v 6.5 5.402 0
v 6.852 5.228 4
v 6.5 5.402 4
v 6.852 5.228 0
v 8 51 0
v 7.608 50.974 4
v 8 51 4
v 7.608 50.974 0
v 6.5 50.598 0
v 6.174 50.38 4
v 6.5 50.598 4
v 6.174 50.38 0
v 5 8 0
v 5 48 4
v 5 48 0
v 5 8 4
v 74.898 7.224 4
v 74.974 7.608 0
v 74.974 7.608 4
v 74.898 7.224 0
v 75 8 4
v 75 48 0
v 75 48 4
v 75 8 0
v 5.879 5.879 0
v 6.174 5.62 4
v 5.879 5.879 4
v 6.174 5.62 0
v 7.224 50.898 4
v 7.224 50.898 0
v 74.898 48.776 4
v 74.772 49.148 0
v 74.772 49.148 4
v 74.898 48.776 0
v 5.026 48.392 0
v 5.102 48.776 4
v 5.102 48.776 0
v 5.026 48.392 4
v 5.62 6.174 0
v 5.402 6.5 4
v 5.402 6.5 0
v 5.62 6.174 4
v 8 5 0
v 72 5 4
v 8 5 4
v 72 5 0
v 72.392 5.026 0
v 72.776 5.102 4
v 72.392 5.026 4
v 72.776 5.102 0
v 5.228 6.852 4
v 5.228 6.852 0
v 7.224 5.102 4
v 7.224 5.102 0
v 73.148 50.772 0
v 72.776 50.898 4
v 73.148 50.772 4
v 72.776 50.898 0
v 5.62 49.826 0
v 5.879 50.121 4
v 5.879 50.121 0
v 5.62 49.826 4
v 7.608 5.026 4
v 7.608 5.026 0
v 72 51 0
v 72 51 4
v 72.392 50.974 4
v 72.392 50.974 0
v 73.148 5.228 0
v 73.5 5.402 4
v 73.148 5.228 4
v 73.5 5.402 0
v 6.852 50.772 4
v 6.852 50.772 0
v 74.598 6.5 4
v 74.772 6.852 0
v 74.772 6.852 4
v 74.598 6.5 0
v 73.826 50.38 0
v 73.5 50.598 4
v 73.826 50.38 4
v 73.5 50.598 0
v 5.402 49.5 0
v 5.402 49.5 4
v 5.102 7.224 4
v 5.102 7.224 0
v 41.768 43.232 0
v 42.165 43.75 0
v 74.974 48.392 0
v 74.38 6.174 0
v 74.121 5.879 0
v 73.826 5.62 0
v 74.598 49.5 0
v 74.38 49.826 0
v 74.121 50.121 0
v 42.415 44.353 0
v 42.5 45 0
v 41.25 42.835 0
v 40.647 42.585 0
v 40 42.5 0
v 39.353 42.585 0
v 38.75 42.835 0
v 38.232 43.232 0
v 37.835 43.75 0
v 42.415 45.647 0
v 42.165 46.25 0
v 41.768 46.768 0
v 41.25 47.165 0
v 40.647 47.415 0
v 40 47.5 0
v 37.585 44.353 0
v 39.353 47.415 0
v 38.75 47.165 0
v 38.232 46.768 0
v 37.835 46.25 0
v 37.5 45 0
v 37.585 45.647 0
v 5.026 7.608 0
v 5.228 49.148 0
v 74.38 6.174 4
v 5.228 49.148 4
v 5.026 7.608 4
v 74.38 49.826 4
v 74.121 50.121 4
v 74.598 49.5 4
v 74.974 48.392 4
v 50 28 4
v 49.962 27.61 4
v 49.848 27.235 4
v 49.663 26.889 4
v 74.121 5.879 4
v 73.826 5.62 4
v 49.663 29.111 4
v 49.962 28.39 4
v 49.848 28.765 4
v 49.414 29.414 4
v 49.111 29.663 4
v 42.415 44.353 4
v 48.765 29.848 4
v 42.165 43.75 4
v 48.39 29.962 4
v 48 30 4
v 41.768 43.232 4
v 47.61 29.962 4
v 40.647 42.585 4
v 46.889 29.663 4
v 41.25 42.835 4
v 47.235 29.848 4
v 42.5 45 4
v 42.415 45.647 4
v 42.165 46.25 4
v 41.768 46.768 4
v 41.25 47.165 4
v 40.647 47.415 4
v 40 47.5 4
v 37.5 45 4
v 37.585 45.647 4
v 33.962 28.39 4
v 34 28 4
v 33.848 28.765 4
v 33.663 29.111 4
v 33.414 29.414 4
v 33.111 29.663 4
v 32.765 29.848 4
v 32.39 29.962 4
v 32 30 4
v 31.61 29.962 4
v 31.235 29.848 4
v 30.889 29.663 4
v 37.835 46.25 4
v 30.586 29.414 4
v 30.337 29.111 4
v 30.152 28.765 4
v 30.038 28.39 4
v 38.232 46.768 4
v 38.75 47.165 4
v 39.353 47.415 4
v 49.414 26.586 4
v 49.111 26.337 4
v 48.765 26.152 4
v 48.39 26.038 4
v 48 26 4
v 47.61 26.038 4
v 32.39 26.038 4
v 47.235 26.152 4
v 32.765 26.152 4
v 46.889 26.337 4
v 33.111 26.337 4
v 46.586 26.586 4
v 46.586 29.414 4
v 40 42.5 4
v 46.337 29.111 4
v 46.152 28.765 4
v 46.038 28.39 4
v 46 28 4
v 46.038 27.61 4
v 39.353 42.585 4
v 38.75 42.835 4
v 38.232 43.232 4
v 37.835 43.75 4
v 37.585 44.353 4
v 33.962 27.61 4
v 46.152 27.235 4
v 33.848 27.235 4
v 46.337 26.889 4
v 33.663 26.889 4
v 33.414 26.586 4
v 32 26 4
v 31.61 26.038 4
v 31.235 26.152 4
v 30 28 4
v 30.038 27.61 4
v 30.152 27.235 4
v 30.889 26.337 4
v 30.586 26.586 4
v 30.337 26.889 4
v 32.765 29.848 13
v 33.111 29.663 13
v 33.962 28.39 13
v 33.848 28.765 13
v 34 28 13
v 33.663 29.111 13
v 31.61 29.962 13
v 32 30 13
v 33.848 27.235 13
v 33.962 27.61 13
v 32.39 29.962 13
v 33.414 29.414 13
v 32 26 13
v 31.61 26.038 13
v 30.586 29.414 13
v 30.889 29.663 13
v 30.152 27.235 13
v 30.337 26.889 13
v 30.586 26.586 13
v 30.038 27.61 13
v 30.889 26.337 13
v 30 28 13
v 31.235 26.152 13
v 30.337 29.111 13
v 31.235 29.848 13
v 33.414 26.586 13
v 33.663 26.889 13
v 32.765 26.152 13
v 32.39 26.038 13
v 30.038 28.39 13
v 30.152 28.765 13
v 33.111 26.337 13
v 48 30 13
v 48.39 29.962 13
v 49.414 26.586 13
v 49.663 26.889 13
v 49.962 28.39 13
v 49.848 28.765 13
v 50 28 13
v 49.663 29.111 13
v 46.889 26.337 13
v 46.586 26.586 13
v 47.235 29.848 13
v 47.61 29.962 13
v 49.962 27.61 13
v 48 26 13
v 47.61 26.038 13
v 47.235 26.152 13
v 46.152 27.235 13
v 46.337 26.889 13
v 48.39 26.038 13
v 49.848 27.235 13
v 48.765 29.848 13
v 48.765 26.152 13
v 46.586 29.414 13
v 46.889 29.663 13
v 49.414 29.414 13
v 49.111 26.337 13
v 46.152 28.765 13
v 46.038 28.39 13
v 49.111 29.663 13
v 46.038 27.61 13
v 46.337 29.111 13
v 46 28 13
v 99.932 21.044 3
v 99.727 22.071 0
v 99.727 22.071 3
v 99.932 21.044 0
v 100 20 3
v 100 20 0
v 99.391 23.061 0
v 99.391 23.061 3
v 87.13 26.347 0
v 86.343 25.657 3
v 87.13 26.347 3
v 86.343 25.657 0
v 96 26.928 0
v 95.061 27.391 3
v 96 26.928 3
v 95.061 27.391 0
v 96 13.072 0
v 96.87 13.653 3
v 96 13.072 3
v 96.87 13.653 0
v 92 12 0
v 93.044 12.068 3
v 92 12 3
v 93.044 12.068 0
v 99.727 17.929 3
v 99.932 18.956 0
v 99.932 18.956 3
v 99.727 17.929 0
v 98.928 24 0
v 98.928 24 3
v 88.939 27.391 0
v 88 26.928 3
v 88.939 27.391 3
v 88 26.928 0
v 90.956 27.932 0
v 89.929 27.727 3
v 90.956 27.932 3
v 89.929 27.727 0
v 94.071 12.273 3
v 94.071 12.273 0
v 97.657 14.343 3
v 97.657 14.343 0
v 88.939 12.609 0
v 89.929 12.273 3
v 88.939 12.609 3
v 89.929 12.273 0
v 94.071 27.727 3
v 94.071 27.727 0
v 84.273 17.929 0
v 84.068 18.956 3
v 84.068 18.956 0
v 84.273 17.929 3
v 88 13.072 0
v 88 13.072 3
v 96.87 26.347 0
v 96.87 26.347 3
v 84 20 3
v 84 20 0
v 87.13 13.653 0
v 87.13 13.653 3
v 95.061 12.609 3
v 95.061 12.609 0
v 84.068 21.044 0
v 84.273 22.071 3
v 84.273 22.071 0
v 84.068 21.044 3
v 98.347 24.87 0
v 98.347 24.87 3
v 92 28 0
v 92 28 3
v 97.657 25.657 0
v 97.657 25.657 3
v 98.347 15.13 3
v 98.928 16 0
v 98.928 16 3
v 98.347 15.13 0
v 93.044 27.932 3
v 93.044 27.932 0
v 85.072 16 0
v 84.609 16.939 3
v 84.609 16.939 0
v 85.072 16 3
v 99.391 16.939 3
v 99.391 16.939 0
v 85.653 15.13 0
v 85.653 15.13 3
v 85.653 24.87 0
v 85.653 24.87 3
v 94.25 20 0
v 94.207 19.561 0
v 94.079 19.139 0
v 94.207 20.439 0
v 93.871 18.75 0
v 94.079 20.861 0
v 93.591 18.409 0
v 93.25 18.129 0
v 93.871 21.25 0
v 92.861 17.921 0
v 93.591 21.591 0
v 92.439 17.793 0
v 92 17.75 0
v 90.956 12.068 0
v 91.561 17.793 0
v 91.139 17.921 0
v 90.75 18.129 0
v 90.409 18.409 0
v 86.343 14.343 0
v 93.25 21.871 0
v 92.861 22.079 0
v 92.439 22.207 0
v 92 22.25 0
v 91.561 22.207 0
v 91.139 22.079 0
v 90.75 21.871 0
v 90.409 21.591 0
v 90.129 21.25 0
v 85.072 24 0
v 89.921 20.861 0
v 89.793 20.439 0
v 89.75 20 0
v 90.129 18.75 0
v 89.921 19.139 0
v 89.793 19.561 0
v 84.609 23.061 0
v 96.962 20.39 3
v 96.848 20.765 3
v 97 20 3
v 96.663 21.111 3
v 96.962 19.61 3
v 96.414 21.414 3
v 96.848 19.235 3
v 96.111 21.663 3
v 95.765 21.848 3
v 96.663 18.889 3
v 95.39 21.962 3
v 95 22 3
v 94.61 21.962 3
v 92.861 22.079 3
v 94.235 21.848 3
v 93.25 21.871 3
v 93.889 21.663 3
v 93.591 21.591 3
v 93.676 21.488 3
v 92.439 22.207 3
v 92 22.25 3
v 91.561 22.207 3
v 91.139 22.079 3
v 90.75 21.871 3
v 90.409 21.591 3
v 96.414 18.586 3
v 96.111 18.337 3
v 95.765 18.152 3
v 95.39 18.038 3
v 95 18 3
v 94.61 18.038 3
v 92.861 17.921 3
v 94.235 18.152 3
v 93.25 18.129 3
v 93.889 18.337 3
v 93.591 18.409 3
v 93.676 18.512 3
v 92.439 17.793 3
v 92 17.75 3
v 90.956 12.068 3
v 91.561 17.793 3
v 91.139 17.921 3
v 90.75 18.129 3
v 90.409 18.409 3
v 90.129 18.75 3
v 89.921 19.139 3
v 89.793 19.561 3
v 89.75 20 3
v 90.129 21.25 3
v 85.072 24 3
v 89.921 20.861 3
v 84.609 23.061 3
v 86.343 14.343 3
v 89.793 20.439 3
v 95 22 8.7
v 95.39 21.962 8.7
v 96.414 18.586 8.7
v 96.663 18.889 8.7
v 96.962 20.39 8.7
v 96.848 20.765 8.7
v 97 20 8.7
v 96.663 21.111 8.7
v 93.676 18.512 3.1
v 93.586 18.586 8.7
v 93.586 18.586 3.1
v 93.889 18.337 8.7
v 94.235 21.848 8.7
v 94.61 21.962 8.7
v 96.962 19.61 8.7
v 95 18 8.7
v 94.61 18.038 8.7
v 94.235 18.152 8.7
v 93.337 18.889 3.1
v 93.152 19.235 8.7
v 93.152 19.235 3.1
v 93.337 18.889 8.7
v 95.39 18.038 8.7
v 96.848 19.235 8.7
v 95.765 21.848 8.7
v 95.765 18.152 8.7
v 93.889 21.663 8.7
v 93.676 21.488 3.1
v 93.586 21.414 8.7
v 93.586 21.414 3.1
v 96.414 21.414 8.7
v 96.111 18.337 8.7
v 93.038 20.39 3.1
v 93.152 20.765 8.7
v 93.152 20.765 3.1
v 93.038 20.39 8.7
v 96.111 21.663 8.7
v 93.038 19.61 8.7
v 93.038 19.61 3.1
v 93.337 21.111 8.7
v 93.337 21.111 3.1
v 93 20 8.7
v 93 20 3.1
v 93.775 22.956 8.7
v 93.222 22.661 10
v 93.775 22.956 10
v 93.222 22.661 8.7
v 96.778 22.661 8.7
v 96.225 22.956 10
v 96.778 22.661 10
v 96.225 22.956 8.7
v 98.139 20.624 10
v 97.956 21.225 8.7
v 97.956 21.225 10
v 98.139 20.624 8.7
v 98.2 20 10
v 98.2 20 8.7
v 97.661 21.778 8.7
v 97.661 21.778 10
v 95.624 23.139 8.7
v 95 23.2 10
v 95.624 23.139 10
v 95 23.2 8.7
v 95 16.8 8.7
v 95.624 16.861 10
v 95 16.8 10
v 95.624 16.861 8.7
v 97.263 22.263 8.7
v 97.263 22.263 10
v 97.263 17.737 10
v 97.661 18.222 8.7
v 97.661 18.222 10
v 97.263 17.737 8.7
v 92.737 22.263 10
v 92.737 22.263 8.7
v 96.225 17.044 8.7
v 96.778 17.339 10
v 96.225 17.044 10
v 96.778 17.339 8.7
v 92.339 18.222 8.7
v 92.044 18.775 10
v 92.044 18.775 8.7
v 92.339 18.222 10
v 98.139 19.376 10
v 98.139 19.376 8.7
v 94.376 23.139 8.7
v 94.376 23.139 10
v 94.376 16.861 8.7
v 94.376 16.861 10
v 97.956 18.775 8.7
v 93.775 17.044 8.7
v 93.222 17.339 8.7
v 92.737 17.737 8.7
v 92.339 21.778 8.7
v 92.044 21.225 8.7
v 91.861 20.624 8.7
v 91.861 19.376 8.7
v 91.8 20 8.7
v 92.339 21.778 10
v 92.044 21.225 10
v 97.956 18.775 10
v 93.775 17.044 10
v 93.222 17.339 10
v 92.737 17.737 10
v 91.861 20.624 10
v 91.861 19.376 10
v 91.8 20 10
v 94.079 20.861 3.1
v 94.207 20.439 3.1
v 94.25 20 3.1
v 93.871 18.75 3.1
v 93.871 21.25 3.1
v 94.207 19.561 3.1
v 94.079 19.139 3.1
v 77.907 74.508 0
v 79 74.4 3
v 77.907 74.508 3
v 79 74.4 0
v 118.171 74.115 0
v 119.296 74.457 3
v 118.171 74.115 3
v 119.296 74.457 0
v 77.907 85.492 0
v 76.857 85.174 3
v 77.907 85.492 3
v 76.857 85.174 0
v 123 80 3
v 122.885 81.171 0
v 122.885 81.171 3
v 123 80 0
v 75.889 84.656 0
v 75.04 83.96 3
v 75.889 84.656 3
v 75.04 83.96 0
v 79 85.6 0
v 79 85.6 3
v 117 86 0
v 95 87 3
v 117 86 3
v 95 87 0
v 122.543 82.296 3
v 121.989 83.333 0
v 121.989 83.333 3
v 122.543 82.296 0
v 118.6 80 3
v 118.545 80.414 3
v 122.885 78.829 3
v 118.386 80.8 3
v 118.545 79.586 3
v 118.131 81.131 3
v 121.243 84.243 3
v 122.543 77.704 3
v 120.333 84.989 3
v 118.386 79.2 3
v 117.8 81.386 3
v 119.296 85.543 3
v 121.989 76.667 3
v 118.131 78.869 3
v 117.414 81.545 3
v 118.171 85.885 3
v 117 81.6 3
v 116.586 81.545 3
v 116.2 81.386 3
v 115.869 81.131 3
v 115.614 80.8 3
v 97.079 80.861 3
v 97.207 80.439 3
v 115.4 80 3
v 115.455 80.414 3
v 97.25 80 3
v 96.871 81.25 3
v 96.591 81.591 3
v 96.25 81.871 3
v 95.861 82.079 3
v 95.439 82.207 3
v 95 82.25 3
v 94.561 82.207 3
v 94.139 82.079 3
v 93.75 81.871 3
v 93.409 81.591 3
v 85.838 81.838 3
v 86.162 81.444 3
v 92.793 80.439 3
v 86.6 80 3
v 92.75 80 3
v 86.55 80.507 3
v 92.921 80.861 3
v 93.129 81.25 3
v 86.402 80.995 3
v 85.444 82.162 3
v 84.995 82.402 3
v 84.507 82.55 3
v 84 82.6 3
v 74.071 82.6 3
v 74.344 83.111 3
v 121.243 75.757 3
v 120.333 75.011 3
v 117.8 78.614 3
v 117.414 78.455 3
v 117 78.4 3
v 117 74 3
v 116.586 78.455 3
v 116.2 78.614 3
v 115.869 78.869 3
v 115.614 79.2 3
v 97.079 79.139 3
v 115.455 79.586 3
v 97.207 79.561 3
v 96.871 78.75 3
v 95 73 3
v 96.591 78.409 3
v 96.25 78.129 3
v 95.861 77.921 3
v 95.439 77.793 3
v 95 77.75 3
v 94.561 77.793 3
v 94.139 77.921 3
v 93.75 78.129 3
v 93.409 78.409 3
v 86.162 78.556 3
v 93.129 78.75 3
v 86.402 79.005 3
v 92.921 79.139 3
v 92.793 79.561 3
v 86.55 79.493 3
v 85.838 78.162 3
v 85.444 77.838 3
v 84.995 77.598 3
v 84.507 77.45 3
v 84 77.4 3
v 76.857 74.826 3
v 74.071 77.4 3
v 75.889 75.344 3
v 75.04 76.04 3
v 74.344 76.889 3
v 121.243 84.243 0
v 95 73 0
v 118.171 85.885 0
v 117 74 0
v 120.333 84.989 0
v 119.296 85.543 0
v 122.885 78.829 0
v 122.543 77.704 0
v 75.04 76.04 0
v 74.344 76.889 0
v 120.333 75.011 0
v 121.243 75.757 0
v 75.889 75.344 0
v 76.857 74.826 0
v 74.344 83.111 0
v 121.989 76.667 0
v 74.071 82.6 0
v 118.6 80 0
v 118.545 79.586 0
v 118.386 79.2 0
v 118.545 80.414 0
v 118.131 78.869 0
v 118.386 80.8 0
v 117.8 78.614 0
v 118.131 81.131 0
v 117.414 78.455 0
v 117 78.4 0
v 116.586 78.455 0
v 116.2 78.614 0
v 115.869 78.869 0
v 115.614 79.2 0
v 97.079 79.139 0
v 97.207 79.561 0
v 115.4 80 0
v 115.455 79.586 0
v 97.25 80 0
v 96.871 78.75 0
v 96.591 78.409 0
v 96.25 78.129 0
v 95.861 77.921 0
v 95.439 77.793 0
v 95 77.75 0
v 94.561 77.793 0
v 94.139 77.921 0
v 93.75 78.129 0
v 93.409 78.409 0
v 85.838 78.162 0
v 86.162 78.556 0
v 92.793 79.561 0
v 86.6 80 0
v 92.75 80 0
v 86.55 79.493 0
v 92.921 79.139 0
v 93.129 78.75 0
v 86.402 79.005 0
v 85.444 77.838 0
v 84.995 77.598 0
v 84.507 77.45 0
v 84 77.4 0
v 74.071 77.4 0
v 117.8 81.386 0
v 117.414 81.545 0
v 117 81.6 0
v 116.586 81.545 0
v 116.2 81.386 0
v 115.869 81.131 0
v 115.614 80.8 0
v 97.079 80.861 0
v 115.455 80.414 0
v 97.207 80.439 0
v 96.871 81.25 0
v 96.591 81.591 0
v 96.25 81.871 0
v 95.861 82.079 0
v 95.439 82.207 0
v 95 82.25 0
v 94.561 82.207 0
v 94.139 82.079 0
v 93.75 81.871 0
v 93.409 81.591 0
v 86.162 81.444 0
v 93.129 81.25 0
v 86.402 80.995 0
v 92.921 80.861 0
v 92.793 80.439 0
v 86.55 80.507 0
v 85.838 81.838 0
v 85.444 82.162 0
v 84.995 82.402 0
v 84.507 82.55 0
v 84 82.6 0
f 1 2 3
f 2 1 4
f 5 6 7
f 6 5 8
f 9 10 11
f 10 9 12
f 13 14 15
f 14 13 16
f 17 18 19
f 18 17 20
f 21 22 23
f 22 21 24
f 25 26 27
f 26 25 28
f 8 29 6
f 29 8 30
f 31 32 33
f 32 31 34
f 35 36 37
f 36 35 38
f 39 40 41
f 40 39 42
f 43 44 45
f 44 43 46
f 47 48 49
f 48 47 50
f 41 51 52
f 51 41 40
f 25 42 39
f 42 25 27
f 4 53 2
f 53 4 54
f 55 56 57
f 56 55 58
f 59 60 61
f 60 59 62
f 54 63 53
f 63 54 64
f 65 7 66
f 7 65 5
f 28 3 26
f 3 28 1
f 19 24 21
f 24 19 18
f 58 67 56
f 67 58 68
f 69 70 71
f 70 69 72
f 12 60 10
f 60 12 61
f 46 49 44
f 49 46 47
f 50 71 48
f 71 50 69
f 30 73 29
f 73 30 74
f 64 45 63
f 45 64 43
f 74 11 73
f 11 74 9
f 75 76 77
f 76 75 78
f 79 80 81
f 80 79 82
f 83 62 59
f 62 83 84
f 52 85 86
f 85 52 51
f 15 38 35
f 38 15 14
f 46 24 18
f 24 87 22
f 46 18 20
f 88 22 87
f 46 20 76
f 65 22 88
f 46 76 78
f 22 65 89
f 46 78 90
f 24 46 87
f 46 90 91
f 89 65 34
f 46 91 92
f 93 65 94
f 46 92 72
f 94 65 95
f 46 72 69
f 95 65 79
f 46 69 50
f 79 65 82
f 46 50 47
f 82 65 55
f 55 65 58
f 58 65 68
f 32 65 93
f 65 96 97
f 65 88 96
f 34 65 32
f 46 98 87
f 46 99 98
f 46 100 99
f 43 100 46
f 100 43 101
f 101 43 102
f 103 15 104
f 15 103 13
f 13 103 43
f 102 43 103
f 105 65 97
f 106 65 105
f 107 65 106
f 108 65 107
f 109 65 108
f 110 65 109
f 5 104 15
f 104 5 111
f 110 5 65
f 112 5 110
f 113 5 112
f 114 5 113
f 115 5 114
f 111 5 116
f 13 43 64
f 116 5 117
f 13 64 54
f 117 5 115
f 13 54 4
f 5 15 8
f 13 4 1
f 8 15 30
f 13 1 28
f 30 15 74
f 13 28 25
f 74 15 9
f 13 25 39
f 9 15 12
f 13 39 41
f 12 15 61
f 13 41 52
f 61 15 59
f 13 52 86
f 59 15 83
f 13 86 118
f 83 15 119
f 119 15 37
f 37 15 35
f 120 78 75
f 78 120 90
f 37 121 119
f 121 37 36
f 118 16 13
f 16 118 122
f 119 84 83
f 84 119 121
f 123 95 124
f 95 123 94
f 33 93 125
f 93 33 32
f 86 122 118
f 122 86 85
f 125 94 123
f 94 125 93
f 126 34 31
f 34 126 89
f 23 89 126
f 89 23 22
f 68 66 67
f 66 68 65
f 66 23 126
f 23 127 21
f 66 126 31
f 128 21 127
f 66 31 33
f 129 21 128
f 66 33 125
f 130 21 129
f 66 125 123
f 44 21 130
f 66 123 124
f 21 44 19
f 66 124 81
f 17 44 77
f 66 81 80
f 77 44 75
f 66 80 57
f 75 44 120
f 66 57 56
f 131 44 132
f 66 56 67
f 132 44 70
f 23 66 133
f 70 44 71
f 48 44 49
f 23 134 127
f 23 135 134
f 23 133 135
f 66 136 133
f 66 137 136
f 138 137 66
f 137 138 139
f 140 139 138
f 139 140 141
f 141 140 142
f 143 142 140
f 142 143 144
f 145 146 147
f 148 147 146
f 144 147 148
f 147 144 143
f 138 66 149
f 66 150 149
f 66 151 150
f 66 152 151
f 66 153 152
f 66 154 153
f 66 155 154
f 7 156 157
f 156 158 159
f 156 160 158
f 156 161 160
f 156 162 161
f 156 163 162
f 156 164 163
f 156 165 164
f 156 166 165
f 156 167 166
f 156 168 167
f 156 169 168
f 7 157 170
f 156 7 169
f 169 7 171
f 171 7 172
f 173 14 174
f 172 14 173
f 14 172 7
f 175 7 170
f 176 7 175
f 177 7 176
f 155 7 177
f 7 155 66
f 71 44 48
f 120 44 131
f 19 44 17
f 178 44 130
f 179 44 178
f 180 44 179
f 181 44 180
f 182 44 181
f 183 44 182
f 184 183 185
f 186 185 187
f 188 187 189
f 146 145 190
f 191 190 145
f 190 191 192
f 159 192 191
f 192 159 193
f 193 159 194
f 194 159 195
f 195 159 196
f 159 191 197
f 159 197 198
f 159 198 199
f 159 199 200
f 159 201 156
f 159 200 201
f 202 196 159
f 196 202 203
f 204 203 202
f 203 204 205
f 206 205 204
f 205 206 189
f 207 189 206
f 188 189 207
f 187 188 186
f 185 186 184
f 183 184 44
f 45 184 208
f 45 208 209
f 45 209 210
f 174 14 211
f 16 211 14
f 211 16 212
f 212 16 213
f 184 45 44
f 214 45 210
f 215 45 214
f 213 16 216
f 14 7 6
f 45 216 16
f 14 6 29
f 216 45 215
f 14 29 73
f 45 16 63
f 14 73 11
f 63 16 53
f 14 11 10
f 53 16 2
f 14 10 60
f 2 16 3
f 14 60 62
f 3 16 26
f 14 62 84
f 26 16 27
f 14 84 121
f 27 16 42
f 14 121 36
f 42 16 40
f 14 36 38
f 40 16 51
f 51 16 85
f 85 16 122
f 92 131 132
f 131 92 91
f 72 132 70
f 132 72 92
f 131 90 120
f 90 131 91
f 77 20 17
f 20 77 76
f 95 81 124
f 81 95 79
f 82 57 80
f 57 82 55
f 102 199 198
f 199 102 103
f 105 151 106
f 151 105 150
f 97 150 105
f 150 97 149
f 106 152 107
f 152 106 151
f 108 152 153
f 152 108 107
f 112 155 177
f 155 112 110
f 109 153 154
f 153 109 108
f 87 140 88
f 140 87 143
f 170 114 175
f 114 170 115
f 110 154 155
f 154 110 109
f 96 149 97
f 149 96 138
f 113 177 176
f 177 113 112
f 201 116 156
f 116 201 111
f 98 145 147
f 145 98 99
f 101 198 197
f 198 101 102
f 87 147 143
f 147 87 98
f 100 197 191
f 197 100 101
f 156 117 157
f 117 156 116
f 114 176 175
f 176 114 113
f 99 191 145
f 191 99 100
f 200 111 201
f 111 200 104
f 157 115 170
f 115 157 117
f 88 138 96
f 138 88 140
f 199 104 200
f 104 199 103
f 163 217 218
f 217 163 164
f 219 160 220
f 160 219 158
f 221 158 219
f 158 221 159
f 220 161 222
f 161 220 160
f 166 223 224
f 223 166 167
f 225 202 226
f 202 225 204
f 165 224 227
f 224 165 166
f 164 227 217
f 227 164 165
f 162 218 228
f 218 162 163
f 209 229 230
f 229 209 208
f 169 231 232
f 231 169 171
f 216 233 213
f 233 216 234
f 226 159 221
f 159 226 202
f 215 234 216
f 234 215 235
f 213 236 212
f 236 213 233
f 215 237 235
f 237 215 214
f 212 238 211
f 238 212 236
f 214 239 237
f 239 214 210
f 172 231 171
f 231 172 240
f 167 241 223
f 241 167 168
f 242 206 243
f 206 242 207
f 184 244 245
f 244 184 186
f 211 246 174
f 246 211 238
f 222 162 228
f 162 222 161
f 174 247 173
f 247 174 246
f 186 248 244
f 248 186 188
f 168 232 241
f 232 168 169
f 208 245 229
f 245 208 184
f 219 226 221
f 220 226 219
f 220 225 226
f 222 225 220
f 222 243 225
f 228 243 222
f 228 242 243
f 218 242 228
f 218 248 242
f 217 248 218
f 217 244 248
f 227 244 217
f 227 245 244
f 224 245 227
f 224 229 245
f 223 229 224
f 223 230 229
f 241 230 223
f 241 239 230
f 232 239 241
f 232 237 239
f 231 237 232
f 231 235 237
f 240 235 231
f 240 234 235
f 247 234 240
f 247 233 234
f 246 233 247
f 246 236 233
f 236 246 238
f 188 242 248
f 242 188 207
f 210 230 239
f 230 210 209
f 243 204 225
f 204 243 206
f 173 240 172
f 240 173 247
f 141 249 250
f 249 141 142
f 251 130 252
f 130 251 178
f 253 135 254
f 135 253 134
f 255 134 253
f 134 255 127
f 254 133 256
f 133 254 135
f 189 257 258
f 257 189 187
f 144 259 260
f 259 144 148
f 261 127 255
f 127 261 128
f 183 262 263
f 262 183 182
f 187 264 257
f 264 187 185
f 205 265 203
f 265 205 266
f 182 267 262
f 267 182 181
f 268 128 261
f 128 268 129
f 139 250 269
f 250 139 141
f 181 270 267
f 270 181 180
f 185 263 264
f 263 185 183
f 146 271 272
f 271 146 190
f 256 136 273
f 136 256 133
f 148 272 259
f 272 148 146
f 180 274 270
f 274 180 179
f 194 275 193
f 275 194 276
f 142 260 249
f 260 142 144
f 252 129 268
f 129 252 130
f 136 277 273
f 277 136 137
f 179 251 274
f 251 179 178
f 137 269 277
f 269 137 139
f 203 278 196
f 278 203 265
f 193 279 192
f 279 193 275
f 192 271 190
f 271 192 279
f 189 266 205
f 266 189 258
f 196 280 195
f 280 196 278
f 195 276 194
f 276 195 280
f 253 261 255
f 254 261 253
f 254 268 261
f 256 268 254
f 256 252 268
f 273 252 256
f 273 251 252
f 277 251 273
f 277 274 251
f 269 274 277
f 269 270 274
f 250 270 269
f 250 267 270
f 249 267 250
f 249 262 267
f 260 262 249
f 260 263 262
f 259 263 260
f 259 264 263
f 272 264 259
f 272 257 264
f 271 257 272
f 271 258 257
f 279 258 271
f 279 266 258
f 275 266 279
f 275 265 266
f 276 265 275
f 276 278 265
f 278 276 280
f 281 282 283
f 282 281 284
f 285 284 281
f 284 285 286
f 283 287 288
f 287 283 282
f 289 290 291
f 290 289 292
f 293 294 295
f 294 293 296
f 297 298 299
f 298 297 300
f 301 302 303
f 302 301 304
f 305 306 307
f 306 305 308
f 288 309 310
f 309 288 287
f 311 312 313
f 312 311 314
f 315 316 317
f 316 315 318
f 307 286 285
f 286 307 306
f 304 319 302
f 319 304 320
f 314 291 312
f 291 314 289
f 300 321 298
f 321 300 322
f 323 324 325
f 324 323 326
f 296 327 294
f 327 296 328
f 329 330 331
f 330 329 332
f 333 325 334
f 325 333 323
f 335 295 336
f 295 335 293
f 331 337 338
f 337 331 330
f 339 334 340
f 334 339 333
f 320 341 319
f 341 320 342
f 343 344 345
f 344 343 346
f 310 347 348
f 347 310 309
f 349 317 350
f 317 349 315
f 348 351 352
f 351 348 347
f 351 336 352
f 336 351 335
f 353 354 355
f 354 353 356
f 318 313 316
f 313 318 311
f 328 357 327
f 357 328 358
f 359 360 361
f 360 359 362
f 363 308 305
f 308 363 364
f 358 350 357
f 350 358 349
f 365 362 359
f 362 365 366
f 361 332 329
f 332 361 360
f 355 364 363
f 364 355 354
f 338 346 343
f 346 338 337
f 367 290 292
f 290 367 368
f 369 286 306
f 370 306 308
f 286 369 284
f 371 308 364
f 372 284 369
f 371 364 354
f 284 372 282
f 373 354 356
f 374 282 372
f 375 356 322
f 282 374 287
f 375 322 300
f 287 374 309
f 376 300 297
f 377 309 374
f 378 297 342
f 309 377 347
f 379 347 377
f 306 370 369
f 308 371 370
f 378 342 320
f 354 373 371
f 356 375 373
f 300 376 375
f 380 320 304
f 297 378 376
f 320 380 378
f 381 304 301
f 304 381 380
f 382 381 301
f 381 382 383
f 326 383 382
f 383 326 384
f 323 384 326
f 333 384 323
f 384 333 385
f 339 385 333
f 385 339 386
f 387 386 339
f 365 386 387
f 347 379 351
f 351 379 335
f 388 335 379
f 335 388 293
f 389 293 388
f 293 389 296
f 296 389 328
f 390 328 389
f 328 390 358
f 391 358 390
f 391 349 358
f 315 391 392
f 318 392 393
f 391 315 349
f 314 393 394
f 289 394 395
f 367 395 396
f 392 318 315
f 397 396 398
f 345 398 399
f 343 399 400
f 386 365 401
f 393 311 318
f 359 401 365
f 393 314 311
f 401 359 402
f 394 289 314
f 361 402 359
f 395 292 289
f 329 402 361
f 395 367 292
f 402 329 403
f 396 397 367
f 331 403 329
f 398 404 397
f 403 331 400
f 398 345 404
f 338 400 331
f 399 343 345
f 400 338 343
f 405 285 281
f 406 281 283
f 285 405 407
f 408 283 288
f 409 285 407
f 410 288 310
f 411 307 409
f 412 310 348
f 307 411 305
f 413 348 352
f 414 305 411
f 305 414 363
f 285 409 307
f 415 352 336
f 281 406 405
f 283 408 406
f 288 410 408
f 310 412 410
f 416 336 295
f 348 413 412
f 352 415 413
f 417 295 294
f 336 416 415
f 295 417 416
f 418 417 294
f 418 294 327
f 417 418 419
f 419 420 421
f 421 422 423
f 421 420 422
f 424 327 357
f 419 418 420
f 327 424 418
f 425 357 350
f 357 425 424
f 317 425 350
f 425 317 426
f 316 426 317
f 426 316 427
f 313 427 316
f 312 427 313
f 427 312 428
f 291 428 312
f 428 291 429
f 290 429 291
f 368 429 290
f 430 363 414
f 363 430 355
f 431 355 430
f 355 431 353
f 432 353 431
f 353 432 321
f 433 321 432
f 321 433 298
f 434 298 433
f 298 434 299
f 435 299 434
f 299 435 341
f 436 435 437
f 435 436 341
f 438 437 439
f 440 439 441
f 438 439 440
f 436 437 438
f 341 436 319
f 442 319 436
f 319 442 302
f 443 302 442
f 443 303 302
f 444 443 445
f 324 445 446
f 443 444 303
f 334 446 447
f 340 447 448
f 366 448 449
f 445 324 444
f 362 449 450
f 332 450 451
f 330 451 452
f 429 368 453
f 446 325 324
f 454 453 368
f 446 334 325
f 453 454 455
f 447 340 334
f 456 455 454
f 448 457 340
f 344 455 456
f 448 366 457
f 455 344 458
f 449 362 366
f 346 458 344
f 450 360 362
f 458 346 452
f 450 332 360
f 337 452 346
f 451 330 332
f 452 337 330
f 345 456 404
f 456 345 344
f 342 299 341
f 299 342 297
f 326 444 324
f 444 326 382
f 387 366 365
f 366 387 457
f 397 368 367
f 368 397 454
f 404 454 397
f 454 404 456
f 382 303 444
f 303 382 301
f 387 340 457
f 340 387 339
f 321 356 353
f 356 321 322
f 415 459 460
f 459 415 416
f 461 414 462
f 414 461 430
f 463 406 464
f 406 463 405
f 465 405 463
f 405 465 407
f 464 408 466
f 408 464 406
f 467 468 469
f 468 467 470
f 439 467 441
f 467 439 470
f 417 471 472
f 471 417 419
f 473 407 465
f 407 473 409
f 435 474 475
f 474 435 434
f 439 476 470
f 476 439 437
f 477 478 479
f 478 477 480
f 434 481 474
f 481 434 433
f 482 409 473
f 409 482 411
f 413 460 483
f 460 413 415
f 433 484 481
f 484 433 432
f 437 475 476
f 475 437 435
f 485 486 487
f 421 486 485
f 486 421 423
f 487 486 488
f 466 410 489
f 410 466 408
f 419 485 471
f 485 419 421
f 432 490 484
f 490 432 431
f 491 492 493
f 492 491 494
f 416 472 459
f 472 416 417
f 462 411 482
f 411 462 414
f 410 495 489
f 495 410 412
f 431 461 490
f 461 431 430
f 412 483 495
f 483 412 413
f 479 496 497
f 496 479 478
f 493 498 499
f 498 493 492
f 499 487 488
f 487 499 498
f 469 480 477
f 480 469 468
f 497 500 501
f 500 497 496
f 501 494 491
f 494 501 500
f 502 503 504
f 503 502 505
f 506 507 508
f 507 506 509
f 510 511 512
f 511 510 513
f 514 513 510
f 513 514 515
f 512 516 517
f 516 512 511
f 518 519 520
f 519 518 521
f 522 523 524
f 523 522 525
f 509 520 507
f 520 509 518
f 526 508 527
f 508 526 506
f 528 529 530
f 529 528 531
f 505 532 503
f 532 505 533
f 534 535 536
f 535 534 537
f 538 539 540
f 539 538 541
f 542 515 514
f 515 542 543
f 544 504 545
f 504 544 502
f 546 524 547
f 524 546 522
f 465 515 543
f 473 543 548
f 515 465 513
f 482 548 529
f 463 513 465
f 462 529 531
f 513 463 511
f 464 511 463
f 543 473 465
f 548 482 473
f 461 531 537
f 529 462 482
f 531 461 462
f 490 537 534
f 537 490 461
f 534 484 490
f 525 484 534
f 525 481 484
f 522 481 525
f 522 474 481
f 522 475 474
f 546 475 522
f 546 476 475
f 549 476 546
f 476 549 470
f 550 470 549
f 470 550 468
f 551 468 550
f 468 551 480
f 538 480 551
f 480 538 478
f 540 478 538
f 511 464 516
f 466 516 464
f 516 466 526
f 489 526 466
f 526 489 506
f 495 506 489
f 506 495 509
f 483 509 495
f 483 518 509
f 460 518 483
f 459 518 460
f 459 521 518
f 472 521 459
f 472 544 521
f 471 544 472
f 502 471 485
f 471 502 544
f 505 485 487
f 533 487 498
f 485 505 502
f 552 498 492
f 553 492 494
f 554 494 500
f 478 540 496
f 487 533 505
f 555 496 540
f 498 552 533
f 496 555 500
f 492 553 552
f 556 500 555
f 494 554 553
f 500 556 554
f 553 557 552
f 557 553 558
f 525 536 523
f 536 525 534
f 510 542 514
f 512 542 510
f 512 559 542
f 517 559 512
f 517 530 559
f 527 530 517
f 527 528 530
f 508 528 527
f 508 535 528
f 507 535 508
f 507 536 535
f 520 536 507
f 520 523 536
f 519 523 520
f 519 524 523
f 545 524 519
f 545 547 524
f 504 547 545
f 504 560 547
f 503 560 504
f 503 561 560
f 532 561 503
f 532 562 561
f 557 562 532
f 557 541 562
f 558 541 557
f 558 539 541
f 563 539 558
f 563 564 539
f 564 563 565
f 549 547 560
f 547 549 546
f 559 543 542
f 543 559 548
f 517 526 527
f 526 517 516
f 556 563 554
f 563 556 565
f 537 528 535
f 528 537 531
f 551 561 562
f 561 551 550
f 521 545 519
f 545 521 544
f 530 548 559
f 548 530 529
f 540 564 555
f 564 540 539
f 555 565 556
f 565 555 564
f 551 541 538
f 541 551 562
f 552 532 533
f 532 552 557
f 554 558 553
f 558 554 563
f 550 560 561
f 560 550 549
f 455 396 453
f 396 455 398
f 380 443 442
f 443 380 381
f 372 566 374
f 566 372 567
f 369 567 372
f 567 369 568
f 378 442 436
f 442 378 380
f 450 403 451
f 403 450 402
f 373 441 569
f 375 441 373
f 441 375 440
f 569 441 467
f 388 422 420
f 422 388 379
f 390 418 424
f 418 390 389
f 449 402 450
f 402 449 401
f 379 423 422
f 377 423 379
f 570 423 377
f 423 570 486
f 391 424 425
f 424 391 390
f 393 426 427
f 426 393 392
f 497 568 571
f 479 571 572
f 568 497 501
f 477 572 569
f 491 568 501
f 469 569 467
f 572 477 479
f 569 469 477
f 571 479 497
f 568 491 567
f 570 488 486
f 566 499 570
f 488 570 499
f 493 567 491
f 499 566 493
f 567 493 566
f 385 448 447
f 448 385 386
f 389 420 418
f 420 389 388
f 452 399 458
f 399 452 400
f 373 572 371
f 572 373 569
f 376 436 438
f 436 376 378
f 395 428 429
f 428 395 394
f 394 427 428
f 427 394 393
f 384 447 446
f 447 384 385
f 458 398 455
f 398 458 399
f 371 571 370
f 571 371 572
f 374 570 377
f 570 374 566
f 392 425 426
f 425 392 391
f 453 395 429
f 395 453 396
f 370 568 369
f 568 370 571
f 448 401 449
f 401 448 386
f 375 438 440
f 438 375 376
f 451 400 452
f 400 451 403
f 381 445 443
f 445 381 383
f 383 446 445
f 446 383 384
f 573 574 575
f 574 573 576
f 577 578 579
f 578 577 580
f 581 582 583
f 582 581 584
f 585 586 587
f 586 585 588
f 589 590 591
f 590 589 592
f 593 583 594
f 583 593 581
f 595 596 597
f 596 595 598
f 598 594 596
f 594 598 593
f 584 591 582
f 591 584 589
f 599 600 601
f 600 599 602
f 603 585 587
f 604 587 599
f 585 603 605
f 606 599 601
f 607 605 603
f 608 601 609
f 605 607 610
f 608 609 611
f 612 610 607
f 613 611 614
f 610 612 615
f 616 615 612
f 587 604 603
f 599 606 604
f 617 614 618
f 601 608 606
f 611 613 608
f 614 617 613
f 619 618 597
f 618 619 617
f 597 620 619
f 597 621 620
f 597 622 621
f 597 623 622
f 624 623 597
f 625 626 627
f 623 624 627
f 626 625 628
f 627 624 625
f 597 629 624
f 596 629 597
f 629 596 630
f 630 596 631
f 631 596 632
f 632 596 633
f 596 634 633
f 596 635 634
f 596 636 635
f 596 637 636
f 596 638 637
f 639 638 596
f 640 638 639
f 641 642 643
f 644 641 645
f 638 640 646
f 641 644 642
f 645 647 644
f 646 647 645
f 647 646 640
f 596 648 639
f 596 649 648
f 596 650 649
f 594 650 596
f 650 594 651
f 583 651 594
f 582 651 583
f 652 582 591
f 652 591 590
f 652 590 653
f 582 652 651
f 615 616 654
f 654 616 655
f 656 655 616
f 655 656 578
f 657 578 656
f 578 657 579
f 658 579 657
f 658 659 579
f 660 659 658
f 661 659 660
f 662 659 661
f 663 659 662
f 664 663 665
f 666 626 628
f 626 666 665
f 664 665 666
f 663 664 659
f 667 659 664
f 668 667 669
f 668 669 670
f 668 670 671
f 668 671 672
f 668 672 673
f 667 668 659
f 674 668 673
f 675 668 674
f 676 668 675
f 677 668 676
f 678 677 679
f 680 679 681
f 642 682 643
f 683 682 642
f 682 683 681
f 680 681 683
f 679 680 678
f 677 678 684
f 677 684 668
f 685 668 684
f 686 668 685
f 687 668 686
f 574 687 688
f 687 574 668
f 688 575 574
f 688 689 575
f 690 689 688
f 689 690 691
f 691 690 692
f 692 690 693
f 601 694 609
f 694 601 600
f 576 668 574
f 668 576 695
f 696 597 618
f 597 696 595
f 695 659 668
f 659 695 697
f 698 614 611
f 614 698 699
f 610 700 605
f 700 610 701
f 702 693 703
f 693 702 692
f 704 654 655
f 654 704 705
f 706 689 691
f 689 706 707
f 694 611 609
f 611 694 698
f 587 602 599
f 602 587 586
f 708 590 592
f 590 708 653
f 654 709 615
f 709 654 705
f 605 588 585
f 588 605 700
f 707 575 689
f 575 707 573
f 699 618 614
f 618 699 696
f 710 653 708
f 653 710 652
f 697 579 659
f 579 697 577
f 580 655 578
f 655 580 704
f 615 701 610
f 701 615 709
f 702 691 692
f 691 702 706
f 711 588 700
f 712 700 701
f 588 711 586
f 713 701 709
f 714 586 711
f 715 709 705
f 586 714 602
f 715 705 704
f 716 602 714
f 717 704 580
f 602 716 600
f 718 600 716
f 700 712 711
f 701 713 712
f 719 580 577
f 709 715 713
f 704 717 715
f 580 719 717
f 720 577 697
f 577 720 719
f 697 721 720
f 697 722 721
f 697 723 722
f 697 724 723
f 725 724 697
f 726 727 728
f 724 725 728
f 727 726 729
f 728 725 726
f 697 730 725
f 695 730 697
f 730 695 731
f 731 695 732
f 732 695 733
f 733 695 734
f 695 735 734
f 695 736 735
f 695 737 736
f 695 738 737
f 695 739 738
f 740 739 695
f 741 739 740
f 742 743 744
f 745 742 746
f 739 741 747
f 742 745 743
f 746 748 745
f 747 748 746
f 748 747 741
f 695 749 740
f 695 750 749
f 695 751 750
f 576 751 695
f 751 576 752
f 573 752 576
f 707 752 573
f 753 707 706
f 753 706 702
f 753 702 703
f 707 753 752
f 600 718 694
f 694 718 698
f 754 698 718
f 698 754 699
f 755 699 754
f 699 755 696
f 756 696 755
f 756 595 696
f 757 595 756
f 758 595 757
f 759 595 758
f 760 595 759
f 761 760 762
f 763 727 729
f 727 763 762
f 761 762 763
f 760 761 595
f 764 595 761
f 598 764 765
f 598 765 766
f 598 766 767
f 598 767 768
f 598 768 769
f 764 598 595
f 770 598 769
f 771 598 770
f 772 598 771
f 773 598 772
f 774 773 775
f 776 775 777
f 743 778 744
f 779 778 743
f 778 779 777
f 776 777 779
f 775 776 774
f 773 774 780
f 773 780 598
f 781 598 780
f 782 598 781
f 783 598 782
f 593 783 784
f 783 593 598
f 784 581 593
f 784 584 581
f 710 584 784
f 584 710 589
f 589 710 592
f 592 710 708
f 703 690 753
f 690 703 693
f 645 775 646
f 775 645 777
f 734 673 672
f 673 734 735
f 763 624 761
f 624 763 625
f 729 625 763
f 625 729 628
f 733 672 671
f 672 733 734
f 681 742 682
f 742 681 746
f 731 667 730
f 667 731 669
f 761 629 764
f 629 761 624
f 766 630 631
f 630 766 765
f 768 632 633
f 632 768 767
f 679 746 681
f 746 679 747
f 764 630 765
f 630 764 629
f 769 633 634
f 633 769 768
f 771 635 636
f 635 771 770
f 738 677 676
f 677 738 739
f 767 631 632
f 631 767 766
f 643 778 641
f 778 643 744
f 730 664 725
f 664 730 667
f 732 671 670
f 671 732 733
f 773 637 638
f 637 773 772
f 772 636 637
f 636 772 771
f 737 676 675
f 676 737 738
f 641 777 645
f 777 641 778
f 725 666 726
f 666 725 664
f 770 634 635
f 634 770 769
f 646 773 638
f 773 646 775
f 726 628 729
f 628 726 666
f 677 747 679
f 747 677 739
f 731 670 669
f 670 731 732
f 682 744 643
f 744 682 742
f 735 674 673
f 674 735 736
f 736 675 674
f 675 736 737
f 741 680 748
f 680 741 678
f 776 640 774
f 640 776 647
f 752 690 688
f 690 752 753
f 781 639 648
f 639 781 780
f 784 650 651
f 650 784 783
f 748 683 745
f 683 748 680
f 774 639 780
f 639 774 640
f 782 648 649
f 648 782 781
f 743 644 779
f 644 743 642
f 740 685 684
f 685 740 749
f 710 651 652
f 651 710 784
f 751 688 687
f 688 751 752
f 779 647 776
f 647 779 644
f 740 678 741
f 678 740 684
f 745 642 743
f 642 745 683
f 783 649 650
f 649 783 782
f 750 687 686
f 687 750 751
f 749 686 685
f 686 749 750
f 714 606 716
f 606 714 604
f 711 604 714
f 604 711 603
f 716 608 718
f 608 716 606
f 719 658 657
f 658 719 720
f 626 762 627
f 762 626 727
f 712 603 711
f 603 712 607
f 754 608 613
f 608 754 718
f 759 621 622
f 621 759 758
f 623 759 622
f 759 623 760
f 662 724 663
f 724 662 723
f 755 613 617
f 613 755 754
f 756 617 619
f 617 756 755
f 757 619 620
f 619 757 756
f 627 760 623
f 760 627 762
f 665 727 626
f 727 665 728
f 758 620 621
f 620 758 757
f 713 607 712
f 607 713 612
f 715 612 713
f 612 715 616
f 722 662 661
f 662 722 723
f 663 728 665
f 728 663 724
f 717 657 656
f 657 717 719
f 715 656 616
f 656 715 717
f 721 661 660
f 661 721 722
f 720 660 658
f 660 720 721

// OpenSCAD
/*
Sample 133: Kurbel-Langloch-Schwinge — Kurbelradius 3 mm
Generated from the FDM Mechanical Sample Library.
Units: millimetres.

Override examples:
  openscad -o custom.stl -D 'view="plate"' -D 'render_fn=64' model.scad
  openscad -o preview.png -D 'view="assembly"' model.scad
*/
use <../../../library/fdm_mechanisms.scad>

render_fn = is_undef(render_fn) ? 48 : render_fn;
view = is_undef(view) ? "plate" : view;
$fn = render_fn;

sample_crank_rocker(
    view=view,
    crank_r=3,
    pivot_offset=16,
    slot_w=5.2,
    pin_d=4,
    rocker_r=22,
    plate_t=3
);
